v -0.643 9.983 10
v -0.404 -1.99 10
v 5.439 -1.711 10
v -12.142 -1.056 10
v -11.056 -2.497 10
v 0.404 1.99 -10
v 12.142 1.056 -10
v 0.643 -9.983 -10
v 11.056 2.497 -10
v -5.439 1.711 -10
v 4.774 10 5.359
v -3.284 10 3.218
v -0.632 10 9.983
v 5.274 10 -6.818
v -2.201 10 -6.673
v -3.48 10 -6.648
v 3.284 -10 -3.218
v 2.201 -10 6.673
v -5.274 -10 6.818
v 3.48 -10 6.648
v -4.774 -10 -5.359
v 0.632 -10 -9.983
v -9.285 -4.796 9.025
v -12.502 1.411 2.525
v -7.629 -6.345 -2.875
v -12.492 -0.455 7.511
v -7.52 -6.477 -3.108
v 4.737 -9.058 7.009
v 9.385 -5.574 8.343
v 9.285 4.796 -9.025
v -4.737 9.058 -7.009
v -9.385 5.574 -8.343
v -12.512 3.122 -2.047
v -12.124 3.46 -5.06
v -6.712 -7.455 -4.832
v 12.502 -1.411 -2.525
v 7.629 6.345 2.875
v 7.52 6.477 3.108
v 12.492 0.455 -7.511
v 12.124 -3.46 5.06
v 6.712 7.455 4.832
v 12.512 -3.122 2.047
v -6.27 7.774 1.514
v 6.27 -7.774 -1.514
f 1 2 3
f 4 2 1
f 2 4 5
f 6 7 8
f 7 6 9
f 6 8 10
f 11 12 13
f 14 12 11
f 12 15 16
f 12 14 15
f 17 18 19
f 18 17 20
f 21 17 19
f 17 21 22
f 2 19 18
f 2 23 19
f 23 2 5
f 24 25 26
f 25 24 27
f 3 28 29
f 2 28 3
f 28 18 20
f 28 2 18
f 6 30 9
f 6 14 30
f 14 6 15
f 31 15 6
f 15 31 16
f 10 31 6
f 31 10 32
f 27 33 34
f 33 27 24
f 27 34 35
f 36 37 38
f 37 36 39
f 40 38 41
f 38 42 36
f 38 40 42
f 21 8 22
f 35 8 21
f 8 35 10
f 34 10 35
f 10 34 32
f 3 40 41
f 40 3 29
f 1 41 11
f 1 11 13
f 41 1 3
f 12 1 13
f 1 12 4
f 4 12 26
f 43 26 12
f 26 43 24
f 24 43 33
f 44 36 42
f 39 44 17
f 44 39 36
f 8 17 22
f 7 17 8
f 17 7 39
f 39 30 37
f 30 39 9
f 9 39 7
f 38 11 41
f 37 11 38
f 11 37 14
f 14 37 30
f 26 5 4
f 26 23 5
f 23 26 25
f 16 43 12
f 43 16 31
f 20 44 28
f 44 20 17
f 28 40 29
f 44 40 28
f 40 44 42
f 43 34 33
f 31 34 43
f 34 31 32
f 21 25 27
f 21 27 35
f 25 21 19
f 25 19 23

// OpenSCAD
echo(version=version());

intersection_for(i = [
			[0, 0, 0],
			[10, 20, 300],
			[200, 40, 57],
			[20, 88, 57]
		])
	rotate(i) cube([100, 20, 20], center = true);
